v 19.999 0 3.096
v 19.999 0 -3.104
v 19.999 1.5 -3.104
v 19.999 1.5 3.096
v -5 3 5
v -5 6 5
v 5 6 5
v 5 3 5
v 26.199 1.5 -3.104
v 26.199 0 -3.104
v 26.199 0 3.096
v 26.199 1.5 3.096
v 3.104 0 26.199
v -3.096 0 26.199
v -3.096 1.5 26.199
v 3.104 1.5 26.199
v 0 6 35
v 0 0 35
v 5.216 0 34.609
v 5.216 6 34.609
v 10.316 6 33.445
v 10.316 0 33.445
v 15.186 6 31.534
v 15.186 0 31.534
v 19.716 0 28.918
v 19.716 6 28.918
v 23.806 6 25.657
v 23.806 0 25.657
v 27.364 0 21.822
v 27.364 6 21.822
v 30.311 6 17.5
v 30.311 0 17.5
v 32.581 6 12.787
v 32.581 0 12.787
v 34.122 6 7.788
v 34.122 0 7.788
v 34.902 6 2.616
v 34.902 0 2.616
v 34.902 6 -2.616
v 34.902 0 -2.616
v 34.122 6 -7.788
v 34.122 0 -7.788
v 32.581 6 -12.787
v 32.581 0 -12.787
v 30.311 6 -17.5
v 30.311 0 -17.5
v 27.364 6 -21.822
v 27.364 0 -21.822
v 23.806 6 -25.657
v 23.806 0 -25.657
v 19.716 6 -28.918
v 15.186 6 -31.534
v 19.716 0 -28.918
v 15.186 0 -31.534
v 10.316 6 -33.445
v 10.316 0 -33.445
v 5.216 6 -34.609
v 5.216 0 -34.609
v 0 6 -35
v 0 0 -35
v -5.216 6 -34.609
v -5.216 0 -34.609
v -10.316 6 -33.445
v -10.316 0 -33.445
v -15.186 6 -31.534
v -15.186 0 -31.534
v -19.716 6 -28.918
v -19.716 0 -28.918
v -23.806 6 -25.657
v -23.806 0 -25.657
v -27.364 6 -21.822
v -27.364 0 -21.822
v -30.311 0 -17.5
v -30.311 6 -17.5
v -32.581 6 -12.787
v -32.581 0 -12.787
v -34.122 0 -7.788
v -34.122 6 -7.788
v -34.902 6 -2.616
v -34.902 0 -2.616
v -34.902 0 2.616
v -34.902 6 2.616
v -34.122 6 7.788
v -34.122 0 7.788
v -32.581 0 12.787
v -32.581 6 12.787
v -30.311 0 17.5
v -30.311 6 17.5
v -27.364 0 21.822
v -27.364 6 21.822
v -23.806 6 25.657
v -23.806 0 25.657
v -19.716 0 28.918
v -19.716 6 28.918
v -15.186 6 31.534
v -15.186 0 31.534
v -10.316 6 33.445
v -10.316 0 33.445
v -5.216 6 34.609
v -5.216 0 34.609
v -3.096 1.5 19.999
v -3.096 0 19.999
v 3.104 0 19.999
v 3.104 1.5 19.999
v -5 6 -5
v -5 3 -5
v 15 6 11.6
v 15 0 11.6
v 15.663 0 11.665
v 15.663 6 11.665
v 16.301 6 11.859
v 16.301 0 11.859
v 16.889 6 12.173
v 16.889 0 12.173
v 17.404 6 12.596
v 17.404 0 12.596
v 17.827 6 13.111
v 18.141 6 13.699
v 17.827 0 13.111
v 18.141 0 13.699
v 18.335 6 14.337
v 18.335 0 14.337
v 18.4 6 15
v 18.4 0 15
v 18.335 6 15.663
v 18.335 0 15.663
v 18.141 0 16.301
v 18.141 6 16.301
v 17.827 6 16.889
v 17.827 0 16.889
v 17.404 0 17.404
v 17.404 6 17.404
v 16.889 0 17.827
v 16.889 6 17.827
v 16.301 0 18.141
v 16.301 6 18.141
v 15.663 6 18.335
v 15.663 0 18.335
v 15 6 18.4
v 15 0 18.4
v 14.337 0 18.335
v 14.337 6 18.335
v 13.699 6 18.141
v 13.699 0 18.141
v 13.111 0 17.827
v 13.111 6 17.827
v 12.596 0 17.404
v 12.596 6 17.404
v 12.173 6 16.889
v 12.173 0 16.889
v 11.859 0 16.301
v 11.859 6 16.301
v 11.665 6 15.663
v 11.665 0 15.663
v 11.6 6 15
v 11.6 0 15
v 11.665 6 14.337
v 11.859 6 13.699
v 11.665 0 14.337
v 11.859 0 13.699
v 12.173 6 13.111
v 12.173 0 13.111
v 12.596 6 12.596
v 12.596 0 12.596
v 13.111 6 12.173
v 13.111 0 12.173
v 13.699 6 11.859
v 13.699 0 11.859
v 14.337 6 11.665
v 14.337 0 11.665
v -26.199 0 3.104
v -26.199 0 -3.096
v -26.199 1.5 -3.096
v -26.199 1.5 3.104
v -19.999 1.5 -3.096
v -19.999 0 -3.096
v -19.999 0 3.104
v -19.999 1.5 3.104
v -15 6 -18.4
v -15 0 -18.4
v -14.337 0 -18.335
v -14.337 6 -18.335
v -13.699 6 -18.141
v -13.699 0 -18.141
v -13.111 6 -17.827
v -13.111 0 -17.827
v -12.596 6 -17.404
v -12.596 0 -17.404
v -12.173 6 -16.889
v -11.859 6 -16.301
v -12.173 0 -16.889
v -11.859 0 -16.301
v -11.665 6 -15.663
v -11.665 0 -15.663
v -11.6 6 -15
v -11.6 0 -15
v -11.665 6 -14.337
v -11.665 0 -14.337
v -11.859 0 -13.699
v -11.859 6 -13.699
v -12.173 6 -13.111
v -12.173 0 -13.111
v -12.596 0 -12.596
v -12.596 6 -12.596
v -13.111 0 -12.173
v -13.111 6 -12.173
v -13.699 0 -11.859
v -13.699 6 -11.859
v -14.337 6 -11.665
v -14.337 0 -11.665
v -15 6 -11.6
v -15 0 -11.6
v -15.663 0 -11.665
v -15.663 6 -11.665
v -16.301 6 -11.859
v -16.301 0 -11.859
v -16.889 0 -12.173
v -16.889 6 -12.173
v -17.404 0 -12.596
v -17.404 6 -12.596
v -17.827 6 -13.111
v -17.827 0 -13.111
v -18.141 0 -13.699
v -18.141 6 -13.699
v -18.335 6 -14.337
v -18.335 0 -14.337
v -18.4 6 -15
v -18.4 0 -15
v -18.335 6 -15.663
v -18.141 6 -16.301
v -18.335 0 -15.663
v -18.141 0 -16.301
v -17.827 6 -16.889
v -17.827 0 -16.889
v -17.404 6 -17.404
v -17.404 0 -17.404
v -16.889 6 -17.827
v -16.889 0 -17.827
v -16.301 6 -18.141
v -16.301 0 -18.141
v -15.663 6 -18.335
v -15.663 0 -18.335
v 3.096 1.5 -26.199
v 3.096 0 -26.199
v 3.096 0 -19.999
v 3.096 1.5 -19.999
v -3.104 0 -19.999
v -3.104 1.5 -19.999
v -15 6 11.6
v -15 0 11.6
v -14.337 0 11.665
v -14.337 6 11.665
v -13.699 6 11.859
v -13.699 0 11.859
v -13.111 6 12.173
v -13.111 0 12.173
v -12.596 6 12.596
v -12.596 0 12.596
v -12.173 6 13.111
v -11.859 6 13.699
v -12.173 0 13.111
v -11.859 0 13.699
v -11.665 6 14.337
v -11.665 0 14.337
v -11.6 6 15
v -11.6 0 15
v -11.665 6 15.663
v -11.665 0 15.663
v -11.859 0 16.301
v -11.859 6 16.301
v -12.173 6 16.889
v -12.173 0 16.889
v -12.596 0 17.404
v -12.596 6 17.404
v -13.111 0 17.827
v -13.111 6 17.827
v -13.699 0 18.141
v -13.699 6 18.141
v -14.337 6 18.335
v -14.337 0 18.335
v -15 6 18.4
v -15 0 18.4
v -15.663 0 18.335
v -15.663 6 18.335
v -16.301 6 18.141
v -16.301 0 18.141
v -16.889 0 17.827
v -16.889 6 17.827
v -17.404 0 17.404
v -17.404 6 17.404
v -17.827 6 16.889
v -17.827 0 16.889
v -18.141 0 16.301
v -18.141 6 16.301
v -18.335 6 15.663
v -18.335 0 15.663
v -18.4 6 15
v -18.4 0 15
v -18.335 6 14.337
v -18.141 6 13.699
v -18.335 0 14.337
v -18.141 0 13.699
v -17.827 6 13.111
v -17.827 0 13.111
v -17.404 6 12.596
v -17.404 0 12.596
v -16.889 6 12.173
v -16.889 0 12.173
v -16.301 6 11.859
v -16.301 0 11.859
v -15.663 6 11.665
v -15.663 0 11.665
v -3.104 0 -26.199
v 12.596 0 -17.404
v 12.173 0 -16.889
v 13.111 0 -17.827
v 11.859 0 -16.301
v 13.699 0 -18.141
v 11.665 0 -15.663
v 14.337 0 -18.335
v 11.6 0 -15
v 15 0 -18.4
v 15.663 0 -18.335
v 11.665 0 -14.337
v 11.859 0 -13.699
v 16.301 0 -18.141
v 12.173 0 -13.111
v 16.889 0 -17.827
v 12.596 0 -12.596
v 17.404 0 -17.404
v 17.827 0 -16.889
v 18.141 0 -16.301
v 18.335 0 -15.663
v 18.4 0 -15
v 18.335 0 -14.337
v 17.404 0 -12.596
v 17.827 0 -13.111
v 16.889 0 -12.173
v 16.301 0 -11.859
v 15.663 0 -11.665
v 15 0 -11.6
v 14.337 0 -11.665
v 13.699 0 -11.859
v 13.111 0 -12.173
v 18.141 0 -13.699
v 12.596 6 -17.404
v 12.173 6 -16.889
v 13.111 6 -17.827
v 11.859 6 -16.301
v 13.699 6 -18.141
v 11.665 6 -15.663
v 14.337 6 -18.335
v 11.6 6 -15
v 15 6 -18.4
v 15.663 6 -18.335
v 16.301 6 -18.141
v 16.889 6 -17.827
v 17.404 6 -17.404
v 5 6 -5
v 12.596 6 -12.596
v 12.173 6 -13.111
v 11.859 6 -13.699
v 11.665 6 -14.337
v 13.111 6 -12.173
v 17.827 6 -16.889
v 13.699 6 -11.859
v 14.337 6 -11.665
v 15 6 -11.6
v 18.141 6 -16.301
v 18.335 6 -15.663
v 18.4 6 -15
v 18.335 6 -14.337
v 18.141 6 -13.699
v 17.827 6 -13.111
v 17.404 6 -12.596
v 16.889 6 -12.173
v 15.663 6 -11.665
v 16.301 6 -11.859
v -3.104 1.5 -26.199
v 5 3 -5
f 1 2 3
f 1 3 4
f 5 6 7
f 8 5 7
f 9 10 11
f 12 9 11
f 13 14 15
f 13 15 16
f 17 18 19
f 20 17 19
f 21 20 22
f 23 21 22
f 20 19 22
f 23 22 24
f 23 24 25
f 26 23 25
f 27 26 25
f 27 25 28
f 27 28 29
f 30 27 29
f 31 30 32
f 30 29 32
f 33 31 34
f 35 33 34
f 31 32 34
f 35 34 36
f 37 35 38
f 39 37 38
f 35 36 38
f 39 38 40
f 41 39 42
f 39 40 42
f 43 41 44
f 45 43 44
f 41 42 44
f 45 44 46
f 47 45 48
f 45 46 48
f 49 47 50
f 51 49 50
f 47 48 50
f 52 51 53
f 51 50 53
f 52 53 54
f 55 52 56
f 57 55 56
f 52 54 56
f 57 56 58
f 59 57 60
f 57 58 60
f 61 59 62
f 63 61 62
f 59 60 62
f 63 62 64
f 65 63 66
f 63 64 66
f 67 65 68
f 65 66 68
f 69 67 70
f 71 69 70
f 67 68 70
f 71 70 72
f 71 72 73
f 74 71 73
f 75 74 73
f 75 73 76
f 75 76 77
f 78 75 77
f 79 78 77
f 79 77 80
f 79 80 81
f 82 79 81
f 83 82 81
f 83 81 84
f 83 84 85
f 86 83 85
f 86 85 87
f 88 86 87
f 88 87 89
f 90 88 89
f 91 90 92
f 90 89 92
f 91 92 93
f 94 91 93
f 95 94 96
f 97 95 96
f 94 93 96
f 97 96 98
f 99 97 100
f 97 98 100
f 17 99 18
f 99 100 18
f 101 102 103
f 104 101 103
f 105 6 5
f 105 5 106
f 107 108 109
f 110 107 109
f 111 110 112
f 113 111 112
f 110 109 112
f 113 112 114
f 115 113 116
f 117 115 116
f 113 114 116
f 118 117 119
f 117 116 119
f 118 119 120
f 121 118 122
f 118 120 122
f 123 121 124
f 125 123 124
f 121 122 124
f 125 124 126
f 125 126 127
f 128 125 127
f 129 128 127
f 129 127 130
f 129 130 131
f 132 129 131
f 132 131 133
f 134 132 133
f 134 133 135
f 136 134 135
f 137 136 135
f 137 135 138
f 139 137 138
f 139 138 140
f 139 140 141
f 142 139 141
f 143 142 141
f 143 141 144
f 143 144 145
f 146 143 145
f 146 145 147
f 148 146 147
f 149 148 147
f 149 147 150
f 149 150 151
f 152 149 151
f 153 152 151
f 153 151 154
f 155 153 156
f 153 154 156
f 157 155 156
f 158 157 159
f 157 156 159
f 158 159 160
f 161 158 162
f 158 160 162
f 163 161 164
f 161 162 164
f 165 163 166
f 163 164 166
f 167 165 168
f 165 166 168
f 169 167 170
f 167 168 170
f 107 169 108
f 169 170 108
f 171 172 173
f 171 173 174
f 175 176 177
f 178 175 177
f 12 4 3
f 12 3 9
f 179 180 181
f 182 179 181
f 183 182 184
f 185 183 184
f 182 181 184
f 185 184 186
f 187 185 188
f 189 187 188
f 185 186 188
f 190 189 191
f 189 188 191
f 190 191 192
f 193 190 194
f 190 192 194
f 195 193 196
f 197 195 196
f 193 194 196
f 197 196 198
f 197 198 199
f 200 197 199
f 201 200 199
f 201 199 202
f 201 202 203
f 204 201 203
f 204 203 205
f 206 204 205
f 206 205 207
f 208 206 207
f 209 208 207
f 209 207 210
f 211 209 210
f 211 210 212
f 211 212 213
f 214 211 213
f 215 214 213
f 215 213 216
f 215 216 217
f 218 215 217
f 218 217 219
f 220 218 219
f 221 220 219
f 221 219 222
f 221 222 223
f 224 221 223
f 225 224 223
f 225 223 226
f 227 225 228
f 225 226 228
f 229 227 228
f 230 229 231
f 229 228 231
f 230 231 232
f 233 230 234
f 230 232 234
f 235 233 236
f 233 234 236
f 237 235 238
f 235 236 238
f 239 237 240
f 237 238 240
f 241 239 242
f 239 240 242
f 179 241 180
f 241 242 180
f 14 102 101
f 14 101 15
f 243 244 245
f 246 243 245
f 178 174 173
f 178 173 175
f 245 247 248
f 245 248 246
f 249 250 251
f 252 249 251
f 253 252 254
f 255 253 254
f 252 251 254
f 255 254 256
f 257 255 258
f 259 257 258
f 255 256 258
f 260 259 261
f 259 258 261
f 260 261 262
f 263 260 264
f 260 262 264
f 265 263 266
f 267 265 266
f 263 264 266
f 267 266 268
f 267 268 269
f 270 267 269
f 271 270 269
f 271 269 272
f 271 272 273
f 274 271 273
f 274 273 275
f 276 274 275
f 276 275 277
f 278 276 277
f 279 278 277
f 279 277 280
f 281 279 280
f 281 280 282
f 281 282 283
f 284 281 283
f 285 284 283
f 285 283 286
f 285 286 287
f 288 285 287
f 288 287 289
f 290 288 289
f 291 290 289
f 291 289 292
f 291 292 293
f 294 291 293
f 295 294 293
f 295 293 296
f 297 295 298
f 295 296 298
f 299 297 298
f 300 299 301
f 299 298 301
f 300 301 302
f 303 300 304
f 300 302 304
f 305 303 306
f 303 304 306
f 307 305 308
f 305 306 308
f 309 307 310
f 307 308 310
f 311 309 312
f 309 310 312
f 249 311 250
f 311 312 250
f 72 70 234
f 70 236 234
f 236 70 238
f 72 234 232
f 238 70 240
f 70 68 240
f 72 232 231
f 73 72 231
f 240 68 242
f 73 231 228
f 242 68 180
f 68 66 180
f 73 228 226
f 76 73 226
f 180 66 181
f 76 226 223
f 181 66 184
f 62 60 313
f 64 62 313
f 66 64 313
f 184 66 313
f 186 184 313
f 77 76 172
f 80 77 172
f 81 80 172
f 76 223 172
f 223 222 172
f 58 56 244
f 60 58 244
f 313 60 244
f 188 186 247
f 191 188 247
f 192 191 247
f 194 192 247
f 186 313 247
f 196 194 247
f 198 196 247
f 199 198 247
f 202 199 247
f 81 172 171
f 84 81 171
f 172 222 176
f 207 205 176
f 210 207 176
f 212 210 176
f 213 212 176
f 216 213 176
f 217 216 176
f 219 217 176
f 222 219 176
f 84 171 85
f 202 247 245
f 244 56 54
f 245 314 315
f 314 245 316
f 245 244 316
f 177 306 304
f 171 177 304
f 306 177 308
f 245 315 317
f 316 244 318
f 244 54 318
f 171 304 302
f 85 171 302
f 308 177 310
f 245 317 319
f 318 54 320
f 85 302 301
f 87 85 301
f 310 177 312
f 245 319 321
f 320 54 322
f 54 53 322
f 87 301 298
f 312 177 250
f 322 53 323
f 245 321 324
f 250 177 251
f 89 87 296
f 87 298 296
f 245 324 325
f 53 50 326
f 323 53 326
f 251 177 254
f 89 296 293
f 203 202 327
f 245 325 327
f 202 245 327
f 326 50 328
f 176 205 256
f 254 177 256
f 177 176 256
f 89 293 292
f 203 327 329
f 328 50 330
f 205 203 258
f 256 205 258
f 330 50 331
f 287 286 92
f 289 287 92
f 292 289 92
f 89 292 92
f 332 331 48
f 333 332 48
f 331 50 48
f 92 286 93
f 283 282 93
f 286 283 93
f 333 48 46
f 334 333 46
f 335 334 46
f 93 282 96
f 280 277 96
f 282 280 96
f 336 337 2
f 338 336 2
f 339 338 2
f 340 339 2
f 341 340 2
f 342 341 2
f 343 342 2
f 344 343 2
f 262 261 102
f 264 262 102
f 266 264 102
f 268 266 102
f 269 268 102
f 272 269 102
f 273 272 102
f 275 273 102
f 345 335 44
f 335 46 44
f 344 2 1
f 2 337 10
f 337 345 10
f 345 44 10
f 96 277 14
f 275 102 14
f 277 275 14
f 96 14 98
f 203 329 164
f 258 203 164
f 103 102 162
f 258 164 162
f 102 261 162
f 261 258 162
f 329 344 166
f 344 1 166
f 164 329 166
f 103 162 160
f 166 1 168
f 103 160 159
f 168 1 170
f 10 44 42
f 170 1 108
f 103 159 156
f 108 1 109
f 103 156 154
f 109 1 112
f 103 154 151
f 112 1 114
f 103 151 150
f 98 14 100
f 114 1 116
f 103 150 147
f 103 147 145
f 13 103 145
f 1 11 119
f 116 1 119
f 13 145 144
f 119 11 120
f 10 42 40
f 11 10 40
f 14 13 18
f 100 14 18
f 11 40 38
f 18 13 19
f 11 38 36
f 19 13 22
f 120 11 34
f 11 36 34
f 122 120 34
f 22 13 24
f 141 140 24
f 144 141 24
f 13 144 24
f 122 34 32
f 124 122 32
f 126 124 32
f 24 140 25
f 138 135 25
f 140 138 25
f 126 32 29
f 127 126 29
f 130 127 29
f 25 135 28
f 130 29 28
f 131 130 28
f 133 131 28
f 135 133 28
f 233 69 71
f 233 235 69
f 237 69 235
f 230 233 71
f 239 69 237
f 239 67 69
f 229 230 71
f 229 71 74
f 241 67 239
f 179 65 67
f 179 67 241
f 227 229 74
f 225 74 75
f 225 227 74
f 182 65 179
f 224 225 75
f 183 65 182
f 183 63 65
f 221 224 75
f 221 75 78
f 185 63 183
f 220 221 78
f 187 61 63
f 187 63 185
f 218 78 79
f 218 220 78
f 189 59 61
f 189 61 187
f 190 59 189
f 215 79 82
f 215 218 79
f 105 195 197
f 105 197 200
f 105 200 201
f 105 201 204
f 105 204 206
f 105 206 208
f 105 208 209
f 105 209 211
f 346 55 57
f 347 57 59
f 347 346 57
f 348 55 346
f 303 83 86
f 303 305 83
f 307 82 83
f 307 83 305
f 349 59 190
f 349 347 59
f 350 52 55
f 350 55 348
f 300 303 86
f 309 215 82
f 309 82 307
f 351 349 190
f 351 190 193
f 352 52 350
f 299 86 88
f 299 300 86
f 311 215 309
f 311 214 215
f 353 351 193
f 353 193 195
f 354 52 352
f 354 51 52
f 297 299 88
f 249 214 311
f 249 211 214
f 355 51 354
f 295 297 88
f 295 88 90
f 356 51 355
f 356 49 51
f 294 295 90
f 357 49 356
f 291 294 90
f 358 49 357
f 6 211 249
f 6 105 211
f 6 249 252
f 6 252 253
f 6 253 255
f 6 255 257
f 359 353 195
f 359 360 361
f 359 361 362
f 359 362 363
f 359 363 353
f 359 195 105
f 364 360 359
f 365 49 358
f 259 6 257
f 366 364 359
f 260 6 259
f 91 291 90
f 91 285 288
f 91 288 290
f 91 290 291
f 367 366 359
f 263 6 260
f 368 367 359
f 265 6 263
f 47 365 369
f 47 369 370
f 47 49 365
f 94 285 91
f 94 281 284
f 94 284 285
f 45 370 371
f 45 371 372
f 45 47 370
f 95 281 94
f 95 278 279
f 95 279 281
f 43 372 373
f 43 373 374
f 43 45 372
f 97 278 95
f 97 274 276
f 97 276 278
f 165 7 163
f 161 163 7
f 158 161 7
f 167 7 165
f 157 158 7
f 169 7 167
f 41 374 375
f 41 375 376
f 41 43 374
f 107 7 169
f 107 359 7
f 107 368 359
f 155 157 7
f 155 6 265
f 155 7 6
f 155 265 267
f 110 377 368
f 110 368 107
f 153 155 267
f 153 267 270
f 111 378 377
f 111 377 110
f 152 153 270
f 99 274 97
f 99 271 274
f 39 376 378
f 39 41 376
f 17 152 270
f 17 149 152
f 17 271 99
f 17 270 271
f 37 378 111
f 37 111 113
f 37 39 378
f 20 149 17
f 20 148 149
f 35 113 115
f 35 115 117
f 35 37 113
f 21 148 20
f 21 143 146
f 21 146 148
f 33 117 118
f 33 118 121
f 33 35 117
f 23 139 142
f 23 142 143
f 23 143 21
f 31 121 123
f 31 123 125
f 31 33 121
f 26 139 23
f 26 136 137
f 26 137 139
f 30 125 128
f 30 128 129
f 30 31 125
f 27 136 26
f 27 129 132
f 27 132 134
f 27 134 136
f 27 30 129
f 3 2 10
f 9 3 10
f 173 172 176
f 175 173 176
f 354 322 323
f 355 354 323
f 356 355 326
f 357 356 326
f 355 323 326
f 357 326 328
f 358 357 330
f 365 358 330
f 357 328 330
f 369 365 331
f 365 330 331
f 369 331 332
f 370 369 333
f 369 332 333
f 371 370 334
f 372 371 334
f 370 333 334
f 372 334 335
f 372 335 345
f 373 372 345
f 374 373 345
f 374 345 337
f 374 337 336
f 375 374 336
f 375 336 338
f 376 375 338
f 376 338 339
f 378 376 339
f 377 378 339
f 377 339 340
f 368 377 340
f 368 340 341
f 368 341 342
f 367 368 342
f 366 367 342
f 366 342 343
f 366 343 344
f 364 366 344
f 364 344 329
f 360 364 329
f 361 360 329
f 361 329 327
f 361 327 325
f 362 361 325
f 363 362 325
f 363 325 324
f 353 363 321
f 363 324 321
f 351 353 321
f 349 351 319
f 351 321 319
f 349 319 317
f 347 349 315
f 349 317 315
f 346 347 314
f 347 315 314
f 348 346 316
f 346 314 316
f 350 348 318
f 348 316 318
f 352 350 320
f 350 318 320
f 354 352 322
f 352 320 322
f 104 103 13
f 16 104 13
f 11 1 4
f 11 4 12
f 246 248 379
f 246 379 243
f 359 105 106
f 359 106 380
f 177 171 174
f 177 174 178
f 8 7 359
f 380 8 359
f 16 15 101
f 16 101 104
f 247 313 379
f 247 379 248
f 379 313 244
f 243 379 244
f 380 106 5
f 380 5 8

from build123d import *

# Parameters (mm, degrees)
SKETCH1_R           = 35
BOSS_EXTRUDE1_DEPTH = 6
SKETCH11_W          = 10
SKETCH11_H          = 10
CUT_EXTRUDE3_DEPTH  = 3
SKETCH12_R          = 3.4
CUT_EXTRUDE4_DEPTH  = 50.859803449
SKETCH6_W           = 6.2
SKETCH6_H           = 6.2
CUT_EXTRUDE6_DEPTH  = 1.5


with BuildPart() as part:
    # Sketch1 → Boss-Extrude1 (new body)
    with BuildSketch(Plane(origin=(0, 0, 0), x_dir=(1, 0, 0), z_dir=(0, 1, 0))):
        with Locations(Location((0, 0, 0), (0, 0, 270))):
            Circle(SKETCH1_R)
    extrude(amount=BOSS_EXTRUDE1_DEPTH)

    # Sketch11 → Cut-Extrude3 (cut)
    with BuildSketch(Plane(origin=(0, 6, 0), x_dir=(1, 0, 0), z_dir=(0, 1, 0))):
        Rectangle(SKETCH11_W, SKETCH11_H)
    extrude(amount=-CUT_EXTRUDE3_DEPTH, mode=Mode.SUBTRACT)

    # Sketch12 → Cut-Extrude4 (cut, through all)
    with BuildSketch(Plane.XZ):
        with Locations(Location((15, -15, 0), (0, 0, 270))):
            Circle(SKETCH12_R)
        with Locations(Location((-15, -15, 0), (0, 0, 270))):
            Circle(SKETCH12_R)
        with Locations(Location((15, 15, 0), (0, 0, 270))):
            Circle(SKETCH12_R)
        with Locations(Location((-15, 15, 0), (0, 0, 270))):
            Circle(SKETCH12_R)
    extrude(amount=-CUT_EXTRUDE4_DEPTH, mode=Mode.SUBTRACT)

    # Sketch6 → Cut-Extrude6 (cut)
    with BuildSketch(Plane(origin=(0, 0, -4.132474232), x_dir=(1, 0, 0), z_dir=(0, -1, 0))):
        with Locations((-23.099150513, 4.136022025)):
            Rectangle(SKETCH6_W, SKETCH6_H)
        with Locations((0.003547793, 27.231624745)):
            Rectangle(SKETCH6_W, SKETCH6_H)
        with Locations((-0.003547793, -18.966676281)):
            Rectangle(SKETCH6_W, SKETCH6_H)
        with Locations((23.099150513, 4.128926439)):
            Rectangle(SKETCH6_W, SKETCH6_H)
    extrude(amount=-CUT_EXTRUDE6_DEPTH, mode=Mode.SUBTRACT)


solid = part.part
